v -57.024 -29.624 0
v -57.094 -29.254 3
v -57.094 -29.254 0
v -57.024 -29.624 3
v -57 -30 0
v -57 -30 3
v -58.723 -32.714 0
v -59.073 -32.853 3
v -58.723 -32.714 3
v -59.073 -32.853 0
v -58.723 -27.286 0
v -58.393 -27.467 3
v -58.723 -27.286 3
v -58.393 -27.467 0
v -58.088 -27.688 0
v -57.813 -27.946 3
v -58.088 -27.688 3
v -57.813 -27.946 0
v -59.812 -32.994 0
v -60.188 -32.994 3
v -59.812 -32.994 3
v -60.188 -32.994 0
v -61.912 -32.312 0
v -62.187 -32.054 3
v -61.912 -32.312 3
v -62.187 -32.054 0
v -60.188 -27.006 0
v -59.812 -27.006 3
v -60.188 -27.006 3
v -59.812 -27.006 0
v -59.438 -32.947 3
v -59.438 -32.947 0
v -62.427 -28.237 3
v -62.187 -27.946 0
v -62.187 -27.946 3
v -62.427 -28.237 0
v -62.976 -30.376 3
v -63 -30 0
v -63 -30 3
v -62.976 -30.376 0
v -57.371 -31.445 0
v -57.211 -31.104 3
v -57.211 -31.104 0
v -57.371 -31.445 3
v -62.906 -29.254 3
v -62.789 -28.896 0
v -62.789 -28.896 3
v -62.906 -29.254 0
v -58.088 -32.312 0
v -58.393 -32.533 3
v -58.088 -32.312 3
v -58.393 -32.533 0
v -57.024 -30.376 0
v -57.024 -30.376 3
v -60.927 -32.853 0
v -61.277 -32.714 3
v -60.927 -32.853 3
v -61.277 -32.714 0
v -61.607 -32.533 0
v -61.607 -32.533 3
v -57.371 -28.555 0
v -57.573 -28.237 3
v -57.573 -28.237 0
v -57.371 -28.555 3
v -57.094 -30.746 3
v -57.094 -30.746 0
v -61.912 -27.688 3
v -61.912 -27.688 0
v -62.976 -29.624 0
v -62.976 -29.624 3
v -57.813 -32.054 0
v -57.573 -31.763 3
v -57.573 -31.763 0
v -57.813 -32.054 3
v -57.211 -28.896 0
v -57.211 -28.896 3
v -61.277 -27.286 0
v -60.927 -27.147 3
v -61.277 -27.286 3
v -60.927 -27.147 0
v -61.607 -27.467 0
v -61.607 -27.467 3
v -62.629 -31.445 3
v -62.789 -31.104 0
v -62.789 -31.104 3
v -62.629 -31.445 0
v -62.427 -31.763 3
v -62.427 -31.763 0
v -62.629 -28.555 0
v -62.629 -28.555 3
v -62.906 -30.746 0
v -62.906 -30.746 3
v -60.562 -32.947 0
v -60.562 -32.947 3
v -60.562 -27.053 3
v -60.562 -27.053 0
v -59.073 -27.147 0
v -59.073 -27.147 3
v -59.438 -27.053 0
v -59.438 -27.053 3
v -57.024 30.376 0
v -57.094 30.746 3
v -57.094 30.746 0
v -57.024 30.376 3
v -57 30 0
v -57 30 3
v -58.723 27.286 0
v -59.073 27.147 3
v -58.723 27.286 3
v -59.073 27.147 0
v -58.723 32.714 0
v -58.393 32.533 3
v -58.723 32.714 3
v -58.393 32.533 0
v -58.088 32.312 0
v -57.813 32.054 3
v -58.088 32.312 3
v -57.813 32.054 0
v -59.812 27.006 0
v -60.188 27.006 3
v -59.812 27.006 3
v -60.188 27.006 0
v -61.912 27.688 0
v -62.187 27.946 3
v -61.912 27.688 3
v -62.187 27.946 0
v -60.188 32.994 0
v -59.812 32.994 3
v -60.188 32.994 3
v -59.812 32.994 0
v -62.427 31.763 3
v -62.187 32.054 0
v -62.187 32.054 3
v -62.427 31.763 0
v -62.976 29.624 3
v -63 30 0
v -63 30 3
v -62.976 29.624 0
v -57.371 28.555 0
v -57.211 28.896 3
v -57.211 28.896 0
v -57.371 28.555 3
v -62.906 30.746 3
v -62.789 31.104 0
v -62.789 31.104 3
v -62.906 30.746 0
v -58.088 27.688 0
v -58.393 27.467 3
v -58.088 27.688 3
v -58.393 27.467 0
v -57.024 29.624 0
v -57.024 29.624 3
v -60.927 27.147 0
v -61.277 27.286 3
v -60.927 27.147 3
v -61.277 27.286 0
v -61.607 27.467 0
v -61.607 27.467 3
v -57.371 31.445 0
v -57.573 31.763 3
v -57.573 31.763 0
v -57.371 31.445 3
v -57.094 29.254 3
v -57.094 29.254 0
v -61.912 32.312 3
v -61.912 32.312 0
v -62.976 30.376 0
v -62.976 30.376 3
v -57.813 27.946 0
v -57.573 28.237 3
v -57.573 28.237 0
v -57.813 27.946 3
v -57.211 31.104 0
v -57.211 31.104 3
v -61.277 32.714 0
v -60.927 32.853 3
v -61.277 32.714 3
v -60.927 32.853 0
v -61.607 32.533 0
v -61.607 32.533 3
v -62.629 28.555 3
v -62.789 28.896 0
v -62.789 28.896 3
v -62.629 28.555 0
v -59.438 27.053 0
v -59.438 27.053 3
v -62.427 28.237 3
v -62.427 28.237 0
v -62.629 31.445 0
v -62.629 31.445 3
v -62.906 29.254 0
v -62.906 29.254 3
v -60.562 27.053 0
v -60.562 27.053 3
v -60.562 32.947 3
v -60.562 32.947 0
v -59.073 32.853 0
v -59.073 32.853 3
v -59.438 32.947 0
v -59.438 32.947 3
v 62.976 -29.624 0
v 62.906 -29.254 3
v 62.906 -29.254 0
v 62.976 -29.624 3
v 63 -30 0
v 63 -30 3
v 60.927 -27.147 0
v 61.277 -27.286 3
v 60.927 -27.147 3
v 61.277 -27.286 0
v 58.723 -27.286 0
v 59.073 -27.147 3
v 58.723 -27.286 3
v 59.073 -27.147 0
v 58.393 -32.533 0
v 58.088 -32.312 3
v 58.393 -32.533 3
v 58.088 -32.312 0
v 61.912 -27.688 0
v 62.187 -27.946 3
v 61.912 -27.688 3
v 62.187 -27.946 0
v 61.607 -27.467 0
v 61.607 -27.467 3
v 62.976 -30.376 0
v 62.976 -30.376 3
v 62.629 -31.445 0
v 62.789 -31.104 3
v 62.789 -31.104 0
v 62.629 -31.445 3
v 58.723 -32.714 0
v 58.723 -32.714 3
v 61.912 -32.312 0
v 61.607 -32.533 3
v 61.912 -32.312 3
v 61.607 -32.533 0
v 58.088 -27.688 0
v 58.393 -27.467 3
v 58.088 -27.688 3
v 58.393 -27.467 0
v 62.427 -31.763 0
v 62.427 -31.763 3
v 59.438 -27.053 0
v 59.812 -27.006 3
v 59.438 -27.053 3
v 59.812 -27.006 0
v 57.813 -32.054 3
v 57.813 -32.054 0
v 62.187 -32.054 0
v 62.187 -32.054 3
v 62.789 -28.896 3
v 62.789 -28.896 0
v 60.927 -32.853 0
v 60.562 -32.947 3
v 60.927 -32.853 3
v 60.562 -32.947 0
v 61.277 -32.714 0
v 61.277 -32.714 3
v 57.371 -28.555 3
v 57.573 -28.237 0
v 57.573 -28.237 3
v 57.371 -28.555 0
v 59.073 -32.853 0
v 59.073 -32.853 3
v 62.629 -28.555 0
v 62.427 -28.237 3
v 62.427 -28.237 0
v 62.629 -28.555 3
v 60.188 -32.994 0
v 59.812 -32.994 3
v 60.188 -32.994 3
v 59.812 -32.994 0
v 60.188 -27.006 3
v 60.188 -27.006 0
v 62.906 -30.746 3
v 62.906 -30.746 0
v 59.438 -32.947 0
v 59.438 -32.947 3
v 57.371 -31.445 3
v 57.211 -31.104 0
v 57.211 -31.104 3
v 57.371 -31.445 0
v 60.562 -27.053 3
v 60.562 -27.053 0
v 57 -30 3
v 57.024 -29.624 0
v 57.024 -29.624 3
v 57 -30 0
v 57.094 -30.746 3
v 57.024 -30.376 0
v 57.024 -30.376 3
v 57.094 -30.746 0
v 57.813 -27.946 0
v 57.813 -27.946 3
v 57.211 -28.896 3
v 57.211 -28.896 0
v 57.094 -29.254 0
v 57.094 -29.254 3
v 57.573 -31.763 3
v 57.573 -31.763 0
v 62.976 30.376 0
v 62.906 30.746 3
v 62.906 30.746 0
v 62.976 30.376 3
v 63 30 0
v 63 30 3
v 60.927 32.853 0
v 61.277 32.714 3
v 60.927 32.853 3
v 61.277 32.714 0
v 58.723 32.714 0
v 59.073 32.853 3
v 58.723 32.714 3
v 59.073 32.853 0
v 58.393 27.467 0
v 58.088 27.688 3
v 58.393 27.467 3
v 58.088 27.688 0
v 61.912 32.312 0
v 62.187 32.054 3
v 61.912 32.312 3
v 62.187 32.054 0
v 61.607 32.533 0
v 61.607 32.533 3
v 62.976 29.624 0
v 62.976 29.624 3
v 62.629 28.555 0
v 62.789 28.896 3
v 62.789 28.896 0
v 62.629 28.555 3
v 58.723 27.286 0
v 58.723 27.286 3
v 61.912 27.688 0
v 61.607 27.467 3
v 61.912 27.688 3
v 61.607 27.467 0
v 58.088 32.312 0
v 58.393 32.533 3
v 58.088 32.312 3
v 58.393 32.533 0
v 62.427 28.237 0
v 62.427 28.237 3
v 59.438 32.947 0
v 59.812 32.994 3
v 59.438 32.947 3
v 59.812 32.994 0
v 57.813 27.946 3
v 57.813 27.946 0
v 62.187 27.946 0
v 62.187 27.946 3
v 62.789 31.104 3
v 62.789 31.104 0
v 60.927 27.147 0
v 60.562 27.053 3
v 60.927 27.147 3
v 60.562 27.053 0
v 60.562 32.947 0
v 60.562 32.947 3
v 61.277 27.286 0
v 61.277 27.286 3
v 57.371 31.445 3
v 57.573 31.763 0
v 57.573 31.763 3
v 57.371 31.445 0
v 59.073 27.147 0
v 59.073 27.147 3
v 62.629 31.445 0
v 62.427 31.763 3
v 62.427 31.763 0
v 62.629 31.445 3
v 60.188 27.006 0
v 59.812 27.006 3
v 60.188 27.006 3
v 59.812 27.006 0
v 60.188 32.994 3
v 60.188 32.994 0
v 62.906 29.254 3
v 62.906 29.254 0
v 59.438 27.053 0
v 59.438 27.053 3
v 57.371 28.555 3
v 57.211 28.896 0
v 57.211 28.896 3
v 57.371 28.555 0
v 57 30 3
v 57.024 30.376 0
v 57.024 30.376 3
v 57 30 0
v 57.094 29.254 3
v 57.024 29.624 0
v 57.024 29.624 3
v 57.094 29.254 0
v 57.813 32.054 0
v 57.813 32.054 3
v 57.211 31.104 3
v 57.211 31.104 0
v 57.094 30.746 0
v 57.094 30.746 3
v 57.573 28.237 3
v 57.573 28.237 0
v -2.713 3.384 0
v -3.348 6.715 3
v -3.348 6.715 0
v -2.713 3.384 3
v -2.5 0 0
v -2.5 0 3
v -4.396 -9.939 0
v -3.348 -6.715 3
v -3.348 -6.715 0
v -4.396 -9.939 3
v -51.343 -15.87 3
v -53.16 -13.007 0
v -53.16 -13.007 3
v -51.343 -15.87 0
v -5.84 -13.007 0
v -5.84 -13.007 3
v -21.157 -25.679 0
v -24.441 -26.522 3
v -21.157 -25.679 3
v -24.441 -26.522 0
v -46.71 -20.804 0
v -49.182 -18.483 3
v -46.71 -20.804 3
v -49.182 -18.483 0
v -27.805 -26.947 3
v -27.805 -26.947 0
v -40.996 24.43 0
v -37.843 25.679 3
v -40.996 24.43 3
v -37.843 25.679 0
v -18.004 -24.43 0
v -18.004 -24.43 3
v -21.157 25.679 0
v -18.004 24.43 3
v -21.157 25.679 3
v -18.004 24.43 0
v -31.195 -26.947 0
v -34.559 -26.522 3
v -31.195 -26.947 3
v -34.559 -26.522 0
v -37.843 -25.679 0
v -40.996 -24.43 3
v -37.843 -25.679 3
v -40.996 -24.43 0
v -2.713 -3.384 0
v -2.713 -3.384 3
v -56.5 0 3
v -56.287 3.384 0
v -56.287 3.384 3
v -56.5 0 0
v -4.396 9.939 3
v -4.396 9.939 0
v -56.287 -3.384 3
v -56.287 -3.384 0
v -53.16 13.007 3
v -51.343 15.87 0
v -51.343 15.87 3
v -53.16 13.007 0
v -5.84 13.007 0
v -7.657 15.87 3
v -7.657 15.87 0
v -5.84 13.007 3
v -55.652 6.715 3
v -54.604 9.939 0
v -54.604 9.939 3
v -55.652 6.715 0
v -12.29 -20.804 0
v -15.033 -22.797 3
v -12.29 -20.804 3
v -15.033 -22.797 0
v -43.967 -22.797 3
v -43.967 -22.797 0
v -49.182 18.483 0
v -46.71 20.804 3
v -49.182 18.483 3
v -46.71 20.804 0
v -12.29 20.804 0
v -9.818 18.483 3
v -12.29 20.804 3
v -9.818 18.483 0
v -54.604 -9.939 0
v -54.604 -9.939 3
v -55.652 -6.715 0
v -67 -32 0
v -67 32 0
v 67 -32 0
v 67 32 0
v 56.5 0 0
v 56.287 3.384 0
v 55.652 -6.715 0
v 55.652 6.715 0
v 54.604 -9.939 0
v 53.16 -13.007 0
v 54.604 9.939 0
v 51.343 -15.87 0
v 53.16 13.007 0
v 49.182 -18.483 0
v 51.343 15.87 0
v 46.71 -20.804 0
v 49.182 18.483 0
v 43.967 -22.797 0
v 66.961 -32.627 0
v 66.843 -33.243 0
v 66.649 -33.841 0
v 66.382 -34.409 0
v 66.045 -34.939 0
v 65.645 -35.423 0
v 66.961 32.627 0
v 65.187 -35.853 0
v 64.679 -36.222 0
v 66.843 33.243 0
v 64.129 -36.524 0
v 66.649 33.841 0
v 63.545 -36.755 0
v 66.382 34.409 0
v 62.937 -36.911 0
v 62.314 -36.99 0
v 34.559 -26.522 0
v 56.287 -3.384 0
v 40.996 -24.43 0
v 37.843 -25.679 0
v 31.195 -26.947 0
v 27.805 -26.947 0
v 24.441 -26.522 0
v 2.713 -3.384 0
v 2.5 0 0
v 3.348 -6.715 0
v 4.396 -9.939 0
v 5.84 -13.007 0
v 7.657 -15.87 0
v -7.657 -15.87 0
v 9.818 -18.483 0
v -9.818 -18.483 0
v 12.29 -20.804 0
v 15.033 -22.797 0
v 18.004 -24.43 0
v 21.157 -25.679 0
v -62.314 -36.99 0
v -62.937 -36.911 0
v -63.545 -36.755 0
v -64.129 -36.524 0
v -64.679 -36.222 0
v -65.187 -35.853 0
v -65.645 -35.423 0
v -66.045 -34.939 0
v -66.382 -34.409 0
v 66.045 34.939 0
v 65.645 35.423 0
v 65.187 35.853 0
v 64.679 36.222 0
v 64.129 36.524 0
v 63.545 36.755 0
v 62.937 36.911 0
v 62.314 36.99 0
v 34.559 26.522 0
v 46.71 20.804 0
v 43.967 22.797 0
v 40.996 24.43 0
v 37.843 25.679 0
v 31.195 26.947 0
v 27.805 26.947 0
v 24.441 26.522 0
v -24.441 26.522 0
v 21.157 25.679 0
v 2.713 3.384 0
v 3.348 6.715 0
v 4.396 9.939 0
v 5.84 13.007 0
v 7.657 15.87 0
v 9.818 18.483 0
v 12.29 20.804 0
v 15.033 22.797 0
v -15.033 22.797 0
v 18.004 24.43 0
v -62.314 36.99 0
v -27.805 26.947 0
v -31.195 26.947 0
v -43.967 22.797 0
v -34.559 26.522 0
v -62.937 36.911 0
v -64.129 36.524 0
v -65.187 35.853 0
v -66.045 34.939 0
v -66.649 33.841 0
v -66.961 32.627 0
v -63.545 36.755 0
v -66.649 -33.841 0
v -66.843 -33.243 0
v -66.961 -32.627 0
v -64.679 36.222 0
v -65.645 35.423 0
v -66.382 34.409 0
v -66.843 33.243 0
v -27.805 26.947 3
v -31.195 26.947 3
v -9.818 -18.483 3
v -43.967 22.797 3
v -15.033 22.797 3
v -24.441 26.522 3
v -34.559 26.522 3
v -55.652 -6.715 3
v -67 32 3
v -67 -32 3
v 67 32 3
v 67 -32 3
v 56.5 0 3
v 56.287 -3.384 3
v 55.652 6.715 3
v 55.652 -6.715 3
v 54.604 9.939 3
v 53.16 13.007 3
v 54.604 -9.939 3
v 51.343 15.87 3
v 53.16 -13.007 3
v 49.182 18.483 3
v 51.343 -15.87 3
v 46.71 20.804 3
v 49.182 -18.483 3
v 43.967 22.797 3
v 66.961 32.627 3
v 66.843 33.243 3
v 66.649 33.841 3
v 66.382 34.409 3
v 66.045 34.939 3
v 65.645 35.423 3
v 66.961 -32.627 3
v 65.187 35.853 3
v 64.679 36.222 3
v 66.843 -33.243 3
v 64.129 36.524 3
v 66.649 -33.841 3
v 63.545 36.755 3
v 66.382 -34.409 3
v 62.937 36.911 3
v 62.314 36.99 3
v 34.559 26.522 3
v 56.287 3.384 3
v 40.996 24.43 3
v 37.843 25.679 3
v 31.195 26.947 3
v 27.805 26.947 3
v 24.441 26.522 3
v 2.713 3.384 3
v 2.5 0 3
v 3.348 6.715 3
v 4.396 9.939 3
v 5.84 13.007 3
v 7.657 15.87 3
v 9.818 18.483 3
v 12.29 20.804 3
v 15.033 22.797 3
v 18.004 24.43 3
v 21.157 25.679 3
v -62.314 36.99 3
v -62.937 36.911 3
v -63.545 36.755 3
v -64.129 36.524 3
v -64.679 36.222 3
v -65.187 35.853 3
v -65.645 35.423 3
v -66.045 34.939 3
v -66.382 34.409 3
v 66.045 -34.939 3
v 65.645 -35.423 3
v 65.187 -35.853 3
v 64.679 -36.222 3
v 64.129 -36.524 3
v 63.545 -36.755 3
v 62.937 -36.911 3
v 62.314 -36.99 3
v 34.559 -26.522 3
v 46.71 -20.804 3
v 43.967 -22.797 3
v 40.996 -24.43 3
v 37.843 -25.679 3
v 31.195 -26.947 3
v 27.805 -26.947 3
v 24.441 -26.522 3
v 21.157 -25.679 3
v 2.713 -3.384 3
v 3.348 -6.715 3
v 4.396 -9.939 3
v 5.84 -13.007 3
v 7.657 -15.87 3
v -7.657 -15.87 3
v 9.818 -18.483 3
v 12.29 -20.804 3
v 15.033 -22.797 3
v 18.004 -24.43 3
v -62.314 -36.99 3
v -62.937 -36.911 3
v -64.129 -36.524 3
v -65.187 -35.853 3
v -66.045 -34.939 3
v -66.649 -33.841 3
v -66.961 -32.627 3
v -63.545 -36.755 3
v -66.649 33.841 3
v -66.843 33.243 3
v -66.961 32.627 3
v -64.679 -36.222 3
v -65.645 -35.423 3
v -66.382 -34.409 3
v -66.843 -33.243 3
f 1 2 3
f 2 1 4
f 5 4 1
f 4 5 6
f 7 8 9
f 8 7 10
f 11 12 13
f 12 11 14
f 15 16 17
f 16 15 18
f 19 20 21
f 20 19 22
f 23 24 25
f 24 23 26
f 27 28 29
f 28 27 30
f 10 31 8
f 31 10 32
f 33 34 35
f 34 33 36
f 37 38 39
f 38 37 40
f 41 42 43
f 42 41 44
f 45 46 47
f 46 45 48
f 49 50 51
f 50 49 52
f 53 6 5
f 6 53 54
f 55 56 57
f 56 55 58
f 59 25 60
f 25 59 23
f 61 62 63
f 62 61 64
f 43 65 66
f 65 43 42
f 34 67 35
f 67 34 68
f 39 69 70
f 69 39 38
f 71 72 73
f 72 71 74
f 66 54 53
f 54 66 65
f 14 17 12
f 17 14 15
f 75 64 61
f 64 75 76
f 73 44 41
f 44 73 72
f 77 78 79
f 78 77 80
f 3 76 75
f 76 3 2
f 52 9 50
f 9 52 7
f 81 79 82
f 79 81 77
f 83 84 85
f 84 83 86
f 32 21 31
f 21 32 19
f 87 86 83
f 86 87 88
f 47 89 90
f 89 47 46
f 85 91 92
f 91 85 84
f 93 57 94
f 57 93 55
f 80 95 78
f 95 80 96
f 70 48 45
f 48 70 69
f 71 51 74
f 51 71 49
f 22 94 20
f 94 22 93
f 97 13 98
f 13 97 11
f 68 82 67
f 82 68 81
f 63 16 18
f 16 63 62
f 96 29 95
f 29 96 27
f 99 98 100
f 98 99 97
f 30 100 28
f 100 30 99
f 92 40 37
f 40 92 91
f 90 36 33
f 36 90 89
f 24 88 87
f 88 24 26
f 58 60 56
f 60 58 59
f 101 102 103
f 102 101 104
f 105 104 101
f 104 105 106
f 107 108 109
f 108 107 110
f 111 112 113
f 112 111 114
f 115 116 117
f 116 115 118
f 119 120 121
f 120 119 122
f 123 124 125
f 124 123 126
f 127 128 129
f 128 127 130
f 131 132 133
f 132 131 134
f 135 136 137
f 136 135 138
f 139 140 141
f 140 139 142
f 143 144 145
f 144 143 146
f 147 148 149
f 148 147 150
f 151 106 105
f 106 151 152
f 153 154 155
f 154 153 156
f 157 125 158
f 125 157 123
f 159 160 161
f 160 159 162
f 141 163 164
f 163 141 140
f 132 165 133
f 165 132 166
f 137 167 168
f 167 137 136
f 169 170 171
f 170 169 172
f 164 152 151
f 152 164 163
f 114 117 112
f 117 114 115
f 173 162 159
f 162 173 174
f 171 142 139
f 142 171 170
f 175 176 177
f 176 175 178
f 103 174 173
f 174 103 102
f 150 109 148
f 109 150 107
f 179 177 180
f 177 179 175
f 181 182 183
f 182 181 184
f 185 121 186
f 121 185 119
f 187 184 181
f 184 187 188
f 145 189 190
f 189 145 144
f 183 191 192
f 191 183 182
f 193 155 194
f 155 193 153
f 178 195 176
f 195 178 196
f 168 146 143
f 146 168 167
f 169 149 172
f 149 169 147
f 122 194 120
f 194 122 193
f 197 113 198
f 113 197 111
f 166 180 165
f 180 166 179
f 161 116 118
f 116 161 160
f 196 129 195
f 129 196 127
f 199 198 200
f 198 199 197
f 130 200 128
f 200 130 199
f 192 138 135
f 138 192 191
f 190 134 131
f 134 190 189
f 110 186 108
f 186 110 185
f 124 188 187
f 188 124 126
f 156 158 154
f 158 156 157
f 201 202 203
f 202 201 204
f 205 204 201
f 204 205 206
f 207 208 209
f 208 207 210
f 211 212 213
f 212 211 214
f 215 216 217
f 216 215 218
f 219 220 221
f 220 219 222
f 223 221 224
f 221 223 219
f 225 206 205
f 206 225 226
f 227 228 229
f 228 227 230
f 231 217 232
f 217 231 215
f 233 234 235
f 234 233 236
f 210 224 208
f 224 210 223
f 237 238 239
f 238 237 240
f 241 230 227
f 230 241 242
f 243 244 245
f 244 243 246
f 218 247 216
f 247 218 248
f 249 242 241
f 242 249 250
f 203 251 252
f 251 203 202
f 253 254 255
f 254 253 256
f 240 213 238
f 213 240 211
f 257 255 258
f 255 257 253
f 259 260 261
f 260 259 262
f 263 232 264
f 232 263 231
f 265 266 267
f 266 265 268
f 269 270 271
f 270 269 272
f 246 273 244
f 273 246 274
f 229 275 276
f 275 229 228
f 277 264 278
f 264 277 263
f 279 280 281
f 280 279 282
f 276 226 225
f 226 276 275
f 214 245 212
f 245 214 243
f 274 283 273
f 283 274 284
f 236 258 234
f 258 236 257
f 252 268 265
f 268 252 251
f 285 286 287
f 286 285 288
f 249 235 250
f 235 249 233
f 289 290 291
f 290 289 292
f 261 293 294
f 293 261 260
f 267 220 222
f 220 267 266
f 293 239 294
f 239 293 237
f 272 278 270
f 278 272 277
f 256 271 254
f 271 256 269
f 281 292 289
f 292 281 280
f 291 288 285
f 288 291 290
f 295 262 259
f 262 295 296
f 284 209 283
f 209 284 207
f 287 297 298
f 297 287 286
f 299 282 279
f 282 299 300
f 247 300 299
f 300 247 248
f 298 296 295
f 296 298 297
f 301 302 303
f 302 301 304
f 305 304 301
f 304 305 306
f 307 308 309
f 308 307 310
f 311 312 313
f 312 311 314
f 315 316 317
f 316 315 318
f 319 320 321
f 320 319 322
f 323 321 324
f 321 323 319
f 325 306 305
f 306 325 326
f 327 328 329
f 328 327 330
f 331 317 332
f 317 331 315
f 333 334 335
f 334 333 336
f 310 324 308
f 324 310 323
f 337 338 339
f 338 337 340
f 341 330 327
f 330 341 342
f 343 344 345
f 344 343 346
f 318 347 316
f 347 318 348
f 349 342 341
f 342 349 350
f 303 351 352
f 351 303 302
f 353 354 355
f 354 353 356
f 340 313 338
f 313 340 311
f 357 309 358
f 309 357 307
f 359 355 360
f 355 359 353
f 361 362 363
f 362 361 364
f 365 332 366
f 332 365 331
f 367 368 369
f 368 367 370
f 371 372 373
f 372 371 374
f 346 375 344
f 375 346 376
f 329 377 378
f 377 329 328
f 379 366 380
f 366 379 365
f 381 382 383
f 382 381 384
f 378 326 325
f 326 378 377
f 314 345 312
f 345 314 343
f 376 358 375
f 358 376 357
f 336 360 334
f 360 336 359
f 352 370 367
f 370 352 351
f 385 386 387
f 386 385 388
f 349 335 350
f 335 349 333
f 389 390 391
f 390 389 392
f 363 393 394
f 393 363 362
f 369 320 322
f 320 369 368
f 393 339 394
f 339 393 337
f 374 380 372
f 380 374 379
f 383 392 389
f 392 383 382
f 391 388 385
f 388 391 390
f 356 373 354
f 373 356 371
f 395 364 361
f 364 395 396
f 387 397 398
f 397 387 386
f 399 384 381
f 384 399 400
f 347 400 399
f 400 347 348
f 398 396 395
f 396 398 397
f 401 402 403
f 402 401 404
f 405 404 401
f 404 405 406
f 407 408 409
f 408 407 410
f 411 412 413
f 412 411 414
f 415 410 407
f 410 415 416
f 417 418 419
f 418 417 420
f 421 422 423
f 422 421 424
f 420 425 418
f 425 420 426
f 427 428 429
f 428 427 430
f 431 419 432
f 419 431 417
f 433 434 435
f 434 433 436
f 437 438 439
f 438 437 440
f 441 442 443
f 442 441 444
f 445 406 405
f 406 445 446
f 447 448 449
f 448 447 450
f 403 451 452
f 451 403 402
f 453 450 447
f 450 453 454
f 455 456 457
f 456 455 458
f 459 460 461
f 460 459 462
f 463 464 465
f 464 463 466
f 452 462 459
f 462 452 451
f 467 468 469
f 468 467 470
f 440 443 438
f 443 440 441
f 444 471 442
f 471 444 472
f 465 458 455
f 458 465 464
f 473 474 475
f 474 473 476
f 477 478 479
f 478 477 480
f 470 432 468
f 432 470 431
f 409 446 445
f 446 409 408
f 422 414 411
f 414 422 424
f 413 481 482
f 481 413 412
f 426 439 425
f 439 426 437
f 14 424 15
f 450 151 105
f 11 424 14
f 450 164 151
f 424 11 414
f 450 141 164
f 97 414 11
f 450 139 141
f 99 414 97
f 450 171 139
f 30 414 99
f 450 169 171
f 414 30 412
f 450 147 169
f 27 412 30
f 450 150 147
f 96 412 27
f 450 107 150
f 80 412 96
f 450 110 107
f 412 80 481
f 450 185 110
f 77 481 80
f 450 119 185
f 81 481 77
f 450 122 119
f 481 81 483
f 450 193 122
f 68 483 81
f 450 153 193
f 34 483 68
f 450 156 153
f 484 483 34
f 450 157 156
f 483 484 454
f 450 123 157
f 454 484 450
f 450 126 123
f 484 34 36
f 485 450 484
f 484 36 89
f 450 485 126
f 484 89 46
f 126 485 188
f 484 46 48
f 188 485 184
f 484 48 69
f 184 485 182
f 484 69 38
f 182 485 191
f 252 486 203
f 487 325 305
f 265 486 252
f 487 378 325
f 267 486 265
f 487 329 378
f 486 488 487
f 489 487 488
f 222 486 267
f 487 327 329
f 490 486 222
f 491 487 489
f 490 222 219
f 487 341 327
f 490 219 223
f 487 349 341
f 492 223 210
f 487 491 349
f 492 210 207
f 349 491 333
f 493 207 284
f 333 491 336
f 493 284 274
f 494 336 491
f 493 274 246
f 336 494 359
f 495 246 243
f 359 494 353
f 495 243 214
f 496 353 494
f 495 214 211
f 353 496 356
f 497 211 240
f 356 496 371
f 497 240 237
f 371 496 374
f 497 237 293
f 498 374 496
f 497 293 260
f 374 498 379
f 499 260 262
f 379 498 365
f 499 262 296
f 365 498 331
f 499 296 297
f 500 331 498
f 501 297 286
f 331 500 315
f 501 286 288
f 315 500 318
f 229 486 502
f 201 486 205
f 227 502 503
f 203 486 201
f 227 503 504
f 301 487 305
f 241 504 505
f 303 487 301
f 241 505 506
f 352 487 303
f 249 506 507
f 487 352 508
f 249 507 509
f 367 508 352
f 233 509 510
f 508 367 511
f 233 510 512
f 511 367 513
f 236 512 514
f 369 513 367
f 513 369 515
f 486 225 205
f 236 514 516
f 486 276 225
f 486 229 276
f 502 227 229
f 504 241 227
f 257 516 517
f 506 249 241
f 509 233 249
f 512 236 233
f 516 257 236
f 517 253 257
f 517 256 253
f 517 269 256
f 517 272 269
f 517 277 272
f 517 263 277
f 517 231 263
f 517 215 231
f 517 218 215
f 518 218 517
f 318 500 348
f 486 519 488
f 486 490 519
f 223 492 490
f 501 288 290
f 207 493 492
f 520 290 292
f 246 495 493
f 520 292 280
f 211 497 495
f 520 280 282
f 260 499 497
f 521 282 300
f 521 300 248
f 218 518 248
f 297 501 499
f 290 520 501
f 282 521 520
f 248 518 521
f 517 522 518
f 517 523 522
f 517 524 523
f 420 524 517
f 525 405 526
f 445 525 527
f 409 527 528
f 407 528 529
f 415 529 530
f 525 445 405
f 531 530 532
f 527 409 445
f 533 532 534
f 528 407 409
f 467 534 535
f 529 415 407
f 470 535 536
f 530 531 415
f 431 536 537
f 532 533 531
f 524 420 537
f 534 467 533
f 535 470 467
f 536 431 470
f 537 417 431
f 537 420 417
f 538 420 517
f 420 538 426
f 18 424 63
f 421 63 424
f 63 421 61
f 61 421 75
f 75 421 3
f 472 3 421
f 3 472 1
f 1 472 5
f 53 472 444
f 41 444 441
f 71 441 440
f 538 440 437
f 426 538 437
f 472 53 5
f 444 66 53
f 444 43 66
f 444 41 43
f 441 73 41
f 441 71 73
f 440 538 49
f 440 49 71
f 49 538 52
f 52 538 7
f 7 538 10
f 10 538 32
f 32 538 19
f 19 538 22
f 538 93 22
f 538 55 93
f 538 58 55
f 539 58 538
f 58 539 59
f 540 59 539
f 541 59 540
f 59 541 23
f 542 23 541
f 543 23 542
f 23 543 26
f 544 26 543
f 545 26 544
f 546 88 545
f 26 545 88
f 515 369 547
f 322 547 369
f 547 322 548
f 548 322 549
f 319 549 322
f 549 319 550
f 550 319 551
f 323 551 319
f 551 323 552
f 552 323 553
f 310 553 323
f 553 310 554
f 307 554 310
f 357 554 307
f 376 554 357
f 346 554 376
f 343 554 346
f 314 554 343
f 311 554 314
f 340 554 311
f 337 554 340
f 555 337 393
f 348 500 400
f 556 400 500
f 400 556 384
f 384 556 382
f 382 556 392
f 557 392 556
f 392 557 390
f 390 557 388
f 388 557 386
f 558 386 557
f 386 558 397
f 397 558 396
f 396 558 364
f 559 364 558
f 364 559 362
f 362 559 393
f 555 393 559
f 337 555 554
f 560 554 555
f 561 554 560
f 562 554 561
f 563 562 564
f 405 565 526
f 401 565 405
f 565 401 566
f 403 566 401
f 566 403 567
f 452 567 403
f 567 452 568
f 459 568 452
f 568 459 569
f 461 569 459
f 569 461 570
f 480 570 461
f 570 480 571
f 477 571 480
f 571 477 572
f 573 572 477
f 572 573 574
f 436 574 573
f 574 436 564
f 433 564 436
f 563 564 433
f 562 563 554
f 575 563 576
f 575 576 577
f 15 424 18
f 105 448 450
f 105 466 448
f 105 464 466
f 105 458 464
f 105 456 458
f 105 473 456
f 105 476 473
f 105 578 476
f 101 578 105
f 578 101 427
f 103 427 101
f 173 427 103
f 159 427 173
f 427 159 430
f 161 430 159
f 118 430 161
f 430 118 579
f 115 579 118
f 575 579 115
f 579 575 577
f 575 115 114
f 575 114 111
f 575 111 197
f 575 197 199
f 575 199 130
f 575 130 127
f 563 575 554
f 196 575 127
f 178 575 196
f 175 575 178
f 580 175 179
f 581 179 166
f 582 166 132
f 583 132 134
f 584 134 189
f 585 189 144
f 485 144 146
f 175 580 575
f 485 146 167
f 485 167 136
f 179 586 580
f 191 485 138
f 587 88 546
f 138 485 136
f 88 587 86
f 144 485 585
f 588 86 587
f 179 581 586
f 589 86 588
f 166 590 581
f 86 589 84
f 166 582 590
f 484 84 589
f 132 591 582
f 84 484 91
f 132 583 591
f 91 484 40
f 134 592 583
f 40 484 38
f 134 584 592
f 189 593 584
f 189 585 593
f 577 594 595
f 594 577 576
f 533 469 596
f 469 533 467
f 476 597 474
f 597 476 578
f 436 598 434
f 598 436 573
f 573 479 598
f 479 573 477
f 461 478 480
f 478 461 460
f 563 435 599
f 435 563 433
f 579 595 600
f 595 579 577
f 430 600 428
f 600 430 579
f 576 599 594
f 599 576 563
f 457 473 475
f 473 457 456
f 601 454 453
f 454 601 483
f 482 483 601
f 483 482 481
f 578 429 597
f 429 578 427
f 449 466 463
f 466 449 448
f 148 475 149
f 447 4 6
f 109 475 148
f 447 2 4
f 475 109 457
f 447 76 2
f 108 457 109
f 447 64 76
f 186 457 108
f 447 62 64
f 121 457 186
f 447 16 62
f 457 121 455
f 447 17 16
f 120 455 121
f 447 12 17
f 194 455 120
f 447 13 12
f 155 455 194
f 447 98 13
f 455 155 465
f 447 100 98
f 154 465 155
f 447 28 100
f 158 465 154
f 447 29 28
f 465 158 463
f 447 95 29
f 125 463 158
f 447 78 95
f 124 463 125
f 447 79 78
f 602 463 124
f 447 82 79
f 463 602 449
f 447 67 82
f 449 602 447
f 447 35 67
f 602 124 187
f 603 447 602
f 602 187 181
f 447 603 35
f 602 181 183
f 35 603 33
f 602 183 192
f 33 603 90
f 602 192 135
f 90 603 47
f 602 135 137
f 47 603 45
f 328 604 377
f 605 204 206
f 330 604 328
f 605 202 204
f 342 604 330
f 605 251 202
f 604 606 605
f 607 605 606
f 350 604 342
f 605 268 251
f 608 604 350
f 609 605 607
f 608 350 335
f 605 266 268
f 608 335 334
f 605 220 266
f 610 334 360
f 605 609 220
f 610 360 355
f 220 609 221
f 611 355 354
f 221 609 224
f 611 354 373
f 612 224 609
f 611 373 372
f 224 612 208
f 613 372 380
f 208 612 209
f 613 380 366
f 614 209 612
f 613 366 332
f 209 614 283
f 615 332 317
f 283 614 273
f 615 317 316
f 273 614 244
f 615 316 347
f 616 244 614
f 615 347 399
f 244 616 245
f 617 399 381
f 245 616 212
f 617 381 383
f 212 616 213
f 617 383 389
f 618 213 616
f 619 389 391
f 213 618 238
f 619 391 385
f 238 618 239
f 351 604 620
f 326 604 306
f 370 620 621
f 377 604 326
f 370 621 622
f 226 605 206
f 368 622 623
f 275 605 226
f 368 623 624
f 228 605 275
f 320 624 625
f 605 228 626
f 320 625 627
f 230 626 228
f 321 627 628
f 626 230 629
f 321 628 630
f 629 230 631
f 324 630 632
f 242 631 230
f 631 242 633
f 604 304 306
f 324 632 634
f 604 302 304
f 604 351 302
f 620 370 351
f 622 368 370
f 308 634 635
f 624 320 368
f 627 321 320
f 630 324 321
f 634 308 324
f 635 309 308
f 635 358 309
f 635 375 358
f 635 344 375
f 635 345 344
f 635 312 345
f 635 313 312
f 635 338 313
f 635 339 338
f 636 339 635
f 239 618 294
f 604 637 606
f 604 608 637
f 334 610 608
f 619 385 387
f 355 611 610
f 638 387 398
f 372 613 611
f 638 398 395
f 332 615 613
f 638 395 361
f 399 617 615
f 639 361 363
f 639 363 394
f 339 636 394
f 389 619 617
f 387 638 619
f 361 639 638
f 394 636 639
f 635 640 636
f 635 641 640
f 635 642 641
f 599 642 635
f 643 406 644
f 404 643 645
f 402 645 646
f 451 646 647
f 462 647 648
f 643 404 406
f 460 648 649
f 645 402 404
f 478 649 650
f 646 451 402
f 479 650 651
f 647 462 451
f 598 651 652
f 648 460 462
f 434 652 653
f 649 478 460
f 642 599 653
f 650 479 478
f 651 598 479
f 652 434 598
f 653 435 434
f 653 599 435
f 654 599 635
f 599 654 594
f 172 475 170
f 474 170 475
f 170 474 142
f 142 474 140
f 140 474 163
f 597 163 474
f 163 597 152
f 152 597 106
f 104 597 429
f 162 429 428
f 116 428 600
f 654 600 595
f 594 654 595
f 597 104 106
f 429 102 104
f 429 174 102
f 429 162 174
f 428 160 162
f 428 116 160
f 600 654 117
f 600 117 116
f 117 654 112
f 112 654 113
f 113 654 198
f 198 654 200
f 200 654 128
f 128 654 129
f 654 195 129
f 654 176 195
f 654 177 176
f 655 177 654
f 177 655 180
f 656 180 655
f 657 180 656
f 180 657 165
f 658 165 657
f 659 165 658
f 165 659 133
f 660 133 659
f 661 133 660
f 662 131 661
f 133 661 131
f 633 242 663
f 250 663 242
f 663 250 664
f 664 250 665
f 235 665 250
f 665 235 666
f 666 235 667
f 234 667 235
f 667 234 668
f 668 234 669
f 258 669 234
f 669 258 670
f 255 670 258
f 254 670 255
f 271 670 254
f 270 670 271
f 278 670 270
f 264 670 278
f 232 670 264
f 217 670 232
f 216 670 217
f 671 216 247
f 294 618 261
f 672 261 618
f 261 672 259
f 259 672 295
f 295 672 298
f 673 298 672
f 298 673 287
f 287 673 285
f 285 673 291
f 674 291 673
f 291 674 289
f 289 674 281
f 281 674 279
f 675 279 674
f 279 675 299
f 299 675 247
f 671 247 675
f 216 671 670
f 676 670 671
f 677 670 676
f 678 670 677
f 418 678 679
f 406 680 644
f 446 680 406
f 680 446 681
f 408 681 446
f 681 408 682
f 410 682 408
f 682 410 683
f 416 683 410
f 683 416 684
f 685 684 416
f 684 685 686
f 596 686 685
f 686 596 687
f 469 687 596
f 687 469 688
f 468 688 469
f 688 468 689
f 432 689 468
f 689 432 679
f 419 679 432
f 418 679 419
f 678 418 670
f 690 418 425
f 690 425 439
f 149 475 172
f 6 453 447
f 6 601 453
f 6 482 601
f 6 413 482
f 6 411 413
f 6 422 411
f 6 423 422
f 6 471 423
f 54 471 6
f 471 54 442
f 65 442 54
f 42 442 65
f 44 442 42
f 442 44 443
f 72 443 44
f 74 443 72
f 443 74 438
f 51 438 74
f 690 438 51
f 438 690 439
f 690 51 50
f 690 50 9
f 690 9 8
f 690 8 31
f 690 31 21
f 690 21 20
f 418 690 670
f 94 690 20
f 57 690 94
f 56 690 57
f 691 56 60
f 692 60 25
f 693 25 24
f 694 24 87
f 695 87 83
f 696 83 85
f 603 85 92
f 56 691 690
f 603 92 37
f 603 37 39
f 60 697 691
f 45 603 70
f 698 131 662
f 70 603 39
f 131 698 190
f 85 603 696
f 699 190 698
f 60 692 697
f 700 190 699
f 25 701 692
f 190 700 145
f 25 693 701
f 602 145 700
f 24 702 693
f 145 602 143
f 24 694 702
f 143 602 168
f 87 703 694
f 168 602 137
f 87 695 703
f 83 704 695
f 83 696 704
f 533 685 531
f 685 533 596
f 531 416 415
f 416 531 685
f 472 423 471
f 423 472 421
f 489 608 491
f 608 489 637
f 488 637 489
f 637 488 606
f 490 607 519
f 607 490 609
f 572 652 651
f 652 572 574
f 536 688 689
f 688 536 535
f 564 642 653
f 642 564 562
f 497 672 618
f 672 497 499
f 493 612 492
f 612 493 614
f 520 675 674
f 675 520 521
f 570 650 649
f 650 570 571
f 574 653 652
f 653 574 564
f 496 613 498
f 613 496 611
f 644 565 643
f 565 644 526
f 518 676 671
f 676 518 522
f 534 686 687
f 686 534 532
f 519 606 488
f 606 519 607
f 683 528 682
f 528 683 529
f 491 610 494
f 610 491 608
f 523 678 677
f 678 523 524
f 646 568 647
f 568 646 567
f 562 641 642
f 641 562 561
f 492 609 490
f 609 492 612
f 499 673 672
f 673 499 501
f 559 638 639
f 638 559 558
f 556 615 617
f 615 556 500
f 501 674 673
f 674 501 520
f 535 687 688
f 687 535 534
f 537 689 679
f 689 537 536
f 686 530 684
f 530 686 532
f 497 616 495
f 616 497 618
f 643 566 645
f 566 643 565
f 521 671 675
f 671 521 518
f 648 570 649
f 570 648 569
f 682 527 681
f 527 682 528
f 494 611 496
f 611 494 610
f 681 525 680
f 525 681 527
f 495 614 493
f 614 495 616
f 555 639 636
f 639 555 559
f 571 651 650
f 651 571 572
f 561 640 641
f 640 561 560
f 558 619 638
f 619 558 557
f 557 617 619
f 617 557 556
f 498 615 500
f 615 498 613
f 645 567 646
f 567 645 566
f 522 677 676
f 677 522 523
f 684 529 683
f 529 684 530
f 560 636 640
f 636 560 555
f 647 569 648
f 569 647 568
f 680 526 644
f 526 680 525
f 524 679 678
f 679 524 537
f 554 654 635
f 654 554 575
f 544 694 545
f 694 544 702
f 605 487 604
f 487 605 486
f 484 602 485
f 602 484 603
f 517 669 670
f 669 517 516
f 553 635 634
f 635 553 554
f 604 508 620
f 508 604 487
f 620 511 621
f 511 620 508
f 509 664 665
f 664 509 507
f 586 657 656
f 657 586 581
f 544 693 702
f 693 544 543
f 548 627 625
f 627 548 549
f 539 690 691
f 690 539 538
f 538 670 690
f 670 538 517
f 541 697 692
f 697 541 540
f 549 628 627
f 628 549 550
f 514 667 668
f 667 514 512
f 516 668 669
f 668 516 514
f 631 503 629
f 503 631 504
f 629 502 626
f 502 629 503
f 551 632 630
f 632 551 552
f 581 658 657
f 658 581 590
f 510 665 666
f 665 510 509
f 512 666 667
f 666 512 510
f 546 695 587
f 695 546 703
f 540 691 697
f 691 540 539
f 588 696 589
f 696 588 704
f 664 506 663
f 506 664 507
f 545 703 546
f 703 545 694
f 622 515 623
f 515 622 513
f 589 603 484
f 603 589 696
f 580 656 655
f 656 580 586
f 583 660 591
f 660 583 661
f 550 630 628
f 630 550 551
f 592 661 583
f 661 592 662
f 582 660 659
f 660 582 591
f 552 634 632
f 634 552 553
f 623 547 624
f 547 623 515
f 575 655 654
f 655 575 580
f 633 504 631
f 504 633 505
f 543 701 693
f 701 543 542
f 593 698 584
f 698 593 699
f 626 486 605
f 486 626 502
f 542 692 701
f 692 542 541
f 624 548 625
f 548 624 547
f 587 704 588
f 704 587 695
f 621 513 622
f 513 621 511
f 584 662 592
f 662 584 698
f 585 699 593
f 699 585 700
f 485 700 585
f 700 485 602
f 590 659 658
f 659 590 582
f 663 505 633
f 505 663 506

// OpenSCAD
$fn = 50;


difference() {
	union() {
		hull() {
			translate(v = [-62.0000000000, 32.0000000000, 0]) {
				cylinder(h = 3, r = 5);
			}
			translate(v = [62.0000000000, 32.0000000000, 0]) {
				cylinder(h = 3, r = 5);
			}
			translate(v = [-62.0000000000, -32.0000000000, 0]) {
				cylinder(h = 3, r = 5);
			}
			translate(v = [62.0000000000, -32.0000000000, 0]) {
				cylinder(h = 3, r = 5);
			}
		}
	}
	union() {
		#translate(v = [-60.0000000000, -30.0000000000, -100.0000000000]) {
			cylinder(h = 200, r = 3.0000000000);
		}
		#translate(v = [-60.0000000000, 30.0000000000, -100.0000000000]) {
			cylinder(h = 200, r = 3.0000000000);
		}
		#translate(v = [60.0000000000, -30.0000000000, -100.0000000000]) {
			cylinder(h = 200, r = 3.0000000000);
		}
		#translate(v = [60.0000000000, 30.0000000000, -100.0000000000]) {
			cylinder(h = 200, r = 3.0000000000);
		}
		#translate(v = [-29.5000000000, 0, 0]) {
			cylinder(h = 3, r = 27.0000000000);
		}
		#translate(v = [29.5000000000, 0, 0]) {
			cylinder(h = 3, r = 27.0000000000);
		}
	}
}
